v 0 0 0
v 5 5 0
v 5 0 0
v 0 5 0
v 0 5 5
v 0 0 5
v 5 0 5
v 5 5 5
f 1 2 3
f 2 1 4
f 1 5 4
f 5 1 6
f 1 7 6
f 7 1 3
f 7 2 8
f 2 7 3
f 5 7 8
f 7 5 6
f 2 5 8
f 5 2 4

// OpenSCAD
// file: lib.scad
// V-001 library: deprecated child() selection forms, pulled in via include.
module first_only() { child(); }
module pick_second() { child(1); }
// main file
// V-001 — Integration Verification Backlog V1: child() ≡ children(0), child(n) ≡ children(n).
// The original renders via deprecated child() (OpenSCAD 2021.01 still evaluates it, with a
// DEPRECATED warning the bundle is allowed to shed); the bundle rewrites it to children(...)
// (SB5002) and must render byte-identical CSG.
include <lib.scad>

// Two children disambiguate child() from children(): child() must select ONLY the first.
first_only() { cube([1, 2, 3]); sphere(9); }
pick_second() { sphere(r = 4); cube(5); }
